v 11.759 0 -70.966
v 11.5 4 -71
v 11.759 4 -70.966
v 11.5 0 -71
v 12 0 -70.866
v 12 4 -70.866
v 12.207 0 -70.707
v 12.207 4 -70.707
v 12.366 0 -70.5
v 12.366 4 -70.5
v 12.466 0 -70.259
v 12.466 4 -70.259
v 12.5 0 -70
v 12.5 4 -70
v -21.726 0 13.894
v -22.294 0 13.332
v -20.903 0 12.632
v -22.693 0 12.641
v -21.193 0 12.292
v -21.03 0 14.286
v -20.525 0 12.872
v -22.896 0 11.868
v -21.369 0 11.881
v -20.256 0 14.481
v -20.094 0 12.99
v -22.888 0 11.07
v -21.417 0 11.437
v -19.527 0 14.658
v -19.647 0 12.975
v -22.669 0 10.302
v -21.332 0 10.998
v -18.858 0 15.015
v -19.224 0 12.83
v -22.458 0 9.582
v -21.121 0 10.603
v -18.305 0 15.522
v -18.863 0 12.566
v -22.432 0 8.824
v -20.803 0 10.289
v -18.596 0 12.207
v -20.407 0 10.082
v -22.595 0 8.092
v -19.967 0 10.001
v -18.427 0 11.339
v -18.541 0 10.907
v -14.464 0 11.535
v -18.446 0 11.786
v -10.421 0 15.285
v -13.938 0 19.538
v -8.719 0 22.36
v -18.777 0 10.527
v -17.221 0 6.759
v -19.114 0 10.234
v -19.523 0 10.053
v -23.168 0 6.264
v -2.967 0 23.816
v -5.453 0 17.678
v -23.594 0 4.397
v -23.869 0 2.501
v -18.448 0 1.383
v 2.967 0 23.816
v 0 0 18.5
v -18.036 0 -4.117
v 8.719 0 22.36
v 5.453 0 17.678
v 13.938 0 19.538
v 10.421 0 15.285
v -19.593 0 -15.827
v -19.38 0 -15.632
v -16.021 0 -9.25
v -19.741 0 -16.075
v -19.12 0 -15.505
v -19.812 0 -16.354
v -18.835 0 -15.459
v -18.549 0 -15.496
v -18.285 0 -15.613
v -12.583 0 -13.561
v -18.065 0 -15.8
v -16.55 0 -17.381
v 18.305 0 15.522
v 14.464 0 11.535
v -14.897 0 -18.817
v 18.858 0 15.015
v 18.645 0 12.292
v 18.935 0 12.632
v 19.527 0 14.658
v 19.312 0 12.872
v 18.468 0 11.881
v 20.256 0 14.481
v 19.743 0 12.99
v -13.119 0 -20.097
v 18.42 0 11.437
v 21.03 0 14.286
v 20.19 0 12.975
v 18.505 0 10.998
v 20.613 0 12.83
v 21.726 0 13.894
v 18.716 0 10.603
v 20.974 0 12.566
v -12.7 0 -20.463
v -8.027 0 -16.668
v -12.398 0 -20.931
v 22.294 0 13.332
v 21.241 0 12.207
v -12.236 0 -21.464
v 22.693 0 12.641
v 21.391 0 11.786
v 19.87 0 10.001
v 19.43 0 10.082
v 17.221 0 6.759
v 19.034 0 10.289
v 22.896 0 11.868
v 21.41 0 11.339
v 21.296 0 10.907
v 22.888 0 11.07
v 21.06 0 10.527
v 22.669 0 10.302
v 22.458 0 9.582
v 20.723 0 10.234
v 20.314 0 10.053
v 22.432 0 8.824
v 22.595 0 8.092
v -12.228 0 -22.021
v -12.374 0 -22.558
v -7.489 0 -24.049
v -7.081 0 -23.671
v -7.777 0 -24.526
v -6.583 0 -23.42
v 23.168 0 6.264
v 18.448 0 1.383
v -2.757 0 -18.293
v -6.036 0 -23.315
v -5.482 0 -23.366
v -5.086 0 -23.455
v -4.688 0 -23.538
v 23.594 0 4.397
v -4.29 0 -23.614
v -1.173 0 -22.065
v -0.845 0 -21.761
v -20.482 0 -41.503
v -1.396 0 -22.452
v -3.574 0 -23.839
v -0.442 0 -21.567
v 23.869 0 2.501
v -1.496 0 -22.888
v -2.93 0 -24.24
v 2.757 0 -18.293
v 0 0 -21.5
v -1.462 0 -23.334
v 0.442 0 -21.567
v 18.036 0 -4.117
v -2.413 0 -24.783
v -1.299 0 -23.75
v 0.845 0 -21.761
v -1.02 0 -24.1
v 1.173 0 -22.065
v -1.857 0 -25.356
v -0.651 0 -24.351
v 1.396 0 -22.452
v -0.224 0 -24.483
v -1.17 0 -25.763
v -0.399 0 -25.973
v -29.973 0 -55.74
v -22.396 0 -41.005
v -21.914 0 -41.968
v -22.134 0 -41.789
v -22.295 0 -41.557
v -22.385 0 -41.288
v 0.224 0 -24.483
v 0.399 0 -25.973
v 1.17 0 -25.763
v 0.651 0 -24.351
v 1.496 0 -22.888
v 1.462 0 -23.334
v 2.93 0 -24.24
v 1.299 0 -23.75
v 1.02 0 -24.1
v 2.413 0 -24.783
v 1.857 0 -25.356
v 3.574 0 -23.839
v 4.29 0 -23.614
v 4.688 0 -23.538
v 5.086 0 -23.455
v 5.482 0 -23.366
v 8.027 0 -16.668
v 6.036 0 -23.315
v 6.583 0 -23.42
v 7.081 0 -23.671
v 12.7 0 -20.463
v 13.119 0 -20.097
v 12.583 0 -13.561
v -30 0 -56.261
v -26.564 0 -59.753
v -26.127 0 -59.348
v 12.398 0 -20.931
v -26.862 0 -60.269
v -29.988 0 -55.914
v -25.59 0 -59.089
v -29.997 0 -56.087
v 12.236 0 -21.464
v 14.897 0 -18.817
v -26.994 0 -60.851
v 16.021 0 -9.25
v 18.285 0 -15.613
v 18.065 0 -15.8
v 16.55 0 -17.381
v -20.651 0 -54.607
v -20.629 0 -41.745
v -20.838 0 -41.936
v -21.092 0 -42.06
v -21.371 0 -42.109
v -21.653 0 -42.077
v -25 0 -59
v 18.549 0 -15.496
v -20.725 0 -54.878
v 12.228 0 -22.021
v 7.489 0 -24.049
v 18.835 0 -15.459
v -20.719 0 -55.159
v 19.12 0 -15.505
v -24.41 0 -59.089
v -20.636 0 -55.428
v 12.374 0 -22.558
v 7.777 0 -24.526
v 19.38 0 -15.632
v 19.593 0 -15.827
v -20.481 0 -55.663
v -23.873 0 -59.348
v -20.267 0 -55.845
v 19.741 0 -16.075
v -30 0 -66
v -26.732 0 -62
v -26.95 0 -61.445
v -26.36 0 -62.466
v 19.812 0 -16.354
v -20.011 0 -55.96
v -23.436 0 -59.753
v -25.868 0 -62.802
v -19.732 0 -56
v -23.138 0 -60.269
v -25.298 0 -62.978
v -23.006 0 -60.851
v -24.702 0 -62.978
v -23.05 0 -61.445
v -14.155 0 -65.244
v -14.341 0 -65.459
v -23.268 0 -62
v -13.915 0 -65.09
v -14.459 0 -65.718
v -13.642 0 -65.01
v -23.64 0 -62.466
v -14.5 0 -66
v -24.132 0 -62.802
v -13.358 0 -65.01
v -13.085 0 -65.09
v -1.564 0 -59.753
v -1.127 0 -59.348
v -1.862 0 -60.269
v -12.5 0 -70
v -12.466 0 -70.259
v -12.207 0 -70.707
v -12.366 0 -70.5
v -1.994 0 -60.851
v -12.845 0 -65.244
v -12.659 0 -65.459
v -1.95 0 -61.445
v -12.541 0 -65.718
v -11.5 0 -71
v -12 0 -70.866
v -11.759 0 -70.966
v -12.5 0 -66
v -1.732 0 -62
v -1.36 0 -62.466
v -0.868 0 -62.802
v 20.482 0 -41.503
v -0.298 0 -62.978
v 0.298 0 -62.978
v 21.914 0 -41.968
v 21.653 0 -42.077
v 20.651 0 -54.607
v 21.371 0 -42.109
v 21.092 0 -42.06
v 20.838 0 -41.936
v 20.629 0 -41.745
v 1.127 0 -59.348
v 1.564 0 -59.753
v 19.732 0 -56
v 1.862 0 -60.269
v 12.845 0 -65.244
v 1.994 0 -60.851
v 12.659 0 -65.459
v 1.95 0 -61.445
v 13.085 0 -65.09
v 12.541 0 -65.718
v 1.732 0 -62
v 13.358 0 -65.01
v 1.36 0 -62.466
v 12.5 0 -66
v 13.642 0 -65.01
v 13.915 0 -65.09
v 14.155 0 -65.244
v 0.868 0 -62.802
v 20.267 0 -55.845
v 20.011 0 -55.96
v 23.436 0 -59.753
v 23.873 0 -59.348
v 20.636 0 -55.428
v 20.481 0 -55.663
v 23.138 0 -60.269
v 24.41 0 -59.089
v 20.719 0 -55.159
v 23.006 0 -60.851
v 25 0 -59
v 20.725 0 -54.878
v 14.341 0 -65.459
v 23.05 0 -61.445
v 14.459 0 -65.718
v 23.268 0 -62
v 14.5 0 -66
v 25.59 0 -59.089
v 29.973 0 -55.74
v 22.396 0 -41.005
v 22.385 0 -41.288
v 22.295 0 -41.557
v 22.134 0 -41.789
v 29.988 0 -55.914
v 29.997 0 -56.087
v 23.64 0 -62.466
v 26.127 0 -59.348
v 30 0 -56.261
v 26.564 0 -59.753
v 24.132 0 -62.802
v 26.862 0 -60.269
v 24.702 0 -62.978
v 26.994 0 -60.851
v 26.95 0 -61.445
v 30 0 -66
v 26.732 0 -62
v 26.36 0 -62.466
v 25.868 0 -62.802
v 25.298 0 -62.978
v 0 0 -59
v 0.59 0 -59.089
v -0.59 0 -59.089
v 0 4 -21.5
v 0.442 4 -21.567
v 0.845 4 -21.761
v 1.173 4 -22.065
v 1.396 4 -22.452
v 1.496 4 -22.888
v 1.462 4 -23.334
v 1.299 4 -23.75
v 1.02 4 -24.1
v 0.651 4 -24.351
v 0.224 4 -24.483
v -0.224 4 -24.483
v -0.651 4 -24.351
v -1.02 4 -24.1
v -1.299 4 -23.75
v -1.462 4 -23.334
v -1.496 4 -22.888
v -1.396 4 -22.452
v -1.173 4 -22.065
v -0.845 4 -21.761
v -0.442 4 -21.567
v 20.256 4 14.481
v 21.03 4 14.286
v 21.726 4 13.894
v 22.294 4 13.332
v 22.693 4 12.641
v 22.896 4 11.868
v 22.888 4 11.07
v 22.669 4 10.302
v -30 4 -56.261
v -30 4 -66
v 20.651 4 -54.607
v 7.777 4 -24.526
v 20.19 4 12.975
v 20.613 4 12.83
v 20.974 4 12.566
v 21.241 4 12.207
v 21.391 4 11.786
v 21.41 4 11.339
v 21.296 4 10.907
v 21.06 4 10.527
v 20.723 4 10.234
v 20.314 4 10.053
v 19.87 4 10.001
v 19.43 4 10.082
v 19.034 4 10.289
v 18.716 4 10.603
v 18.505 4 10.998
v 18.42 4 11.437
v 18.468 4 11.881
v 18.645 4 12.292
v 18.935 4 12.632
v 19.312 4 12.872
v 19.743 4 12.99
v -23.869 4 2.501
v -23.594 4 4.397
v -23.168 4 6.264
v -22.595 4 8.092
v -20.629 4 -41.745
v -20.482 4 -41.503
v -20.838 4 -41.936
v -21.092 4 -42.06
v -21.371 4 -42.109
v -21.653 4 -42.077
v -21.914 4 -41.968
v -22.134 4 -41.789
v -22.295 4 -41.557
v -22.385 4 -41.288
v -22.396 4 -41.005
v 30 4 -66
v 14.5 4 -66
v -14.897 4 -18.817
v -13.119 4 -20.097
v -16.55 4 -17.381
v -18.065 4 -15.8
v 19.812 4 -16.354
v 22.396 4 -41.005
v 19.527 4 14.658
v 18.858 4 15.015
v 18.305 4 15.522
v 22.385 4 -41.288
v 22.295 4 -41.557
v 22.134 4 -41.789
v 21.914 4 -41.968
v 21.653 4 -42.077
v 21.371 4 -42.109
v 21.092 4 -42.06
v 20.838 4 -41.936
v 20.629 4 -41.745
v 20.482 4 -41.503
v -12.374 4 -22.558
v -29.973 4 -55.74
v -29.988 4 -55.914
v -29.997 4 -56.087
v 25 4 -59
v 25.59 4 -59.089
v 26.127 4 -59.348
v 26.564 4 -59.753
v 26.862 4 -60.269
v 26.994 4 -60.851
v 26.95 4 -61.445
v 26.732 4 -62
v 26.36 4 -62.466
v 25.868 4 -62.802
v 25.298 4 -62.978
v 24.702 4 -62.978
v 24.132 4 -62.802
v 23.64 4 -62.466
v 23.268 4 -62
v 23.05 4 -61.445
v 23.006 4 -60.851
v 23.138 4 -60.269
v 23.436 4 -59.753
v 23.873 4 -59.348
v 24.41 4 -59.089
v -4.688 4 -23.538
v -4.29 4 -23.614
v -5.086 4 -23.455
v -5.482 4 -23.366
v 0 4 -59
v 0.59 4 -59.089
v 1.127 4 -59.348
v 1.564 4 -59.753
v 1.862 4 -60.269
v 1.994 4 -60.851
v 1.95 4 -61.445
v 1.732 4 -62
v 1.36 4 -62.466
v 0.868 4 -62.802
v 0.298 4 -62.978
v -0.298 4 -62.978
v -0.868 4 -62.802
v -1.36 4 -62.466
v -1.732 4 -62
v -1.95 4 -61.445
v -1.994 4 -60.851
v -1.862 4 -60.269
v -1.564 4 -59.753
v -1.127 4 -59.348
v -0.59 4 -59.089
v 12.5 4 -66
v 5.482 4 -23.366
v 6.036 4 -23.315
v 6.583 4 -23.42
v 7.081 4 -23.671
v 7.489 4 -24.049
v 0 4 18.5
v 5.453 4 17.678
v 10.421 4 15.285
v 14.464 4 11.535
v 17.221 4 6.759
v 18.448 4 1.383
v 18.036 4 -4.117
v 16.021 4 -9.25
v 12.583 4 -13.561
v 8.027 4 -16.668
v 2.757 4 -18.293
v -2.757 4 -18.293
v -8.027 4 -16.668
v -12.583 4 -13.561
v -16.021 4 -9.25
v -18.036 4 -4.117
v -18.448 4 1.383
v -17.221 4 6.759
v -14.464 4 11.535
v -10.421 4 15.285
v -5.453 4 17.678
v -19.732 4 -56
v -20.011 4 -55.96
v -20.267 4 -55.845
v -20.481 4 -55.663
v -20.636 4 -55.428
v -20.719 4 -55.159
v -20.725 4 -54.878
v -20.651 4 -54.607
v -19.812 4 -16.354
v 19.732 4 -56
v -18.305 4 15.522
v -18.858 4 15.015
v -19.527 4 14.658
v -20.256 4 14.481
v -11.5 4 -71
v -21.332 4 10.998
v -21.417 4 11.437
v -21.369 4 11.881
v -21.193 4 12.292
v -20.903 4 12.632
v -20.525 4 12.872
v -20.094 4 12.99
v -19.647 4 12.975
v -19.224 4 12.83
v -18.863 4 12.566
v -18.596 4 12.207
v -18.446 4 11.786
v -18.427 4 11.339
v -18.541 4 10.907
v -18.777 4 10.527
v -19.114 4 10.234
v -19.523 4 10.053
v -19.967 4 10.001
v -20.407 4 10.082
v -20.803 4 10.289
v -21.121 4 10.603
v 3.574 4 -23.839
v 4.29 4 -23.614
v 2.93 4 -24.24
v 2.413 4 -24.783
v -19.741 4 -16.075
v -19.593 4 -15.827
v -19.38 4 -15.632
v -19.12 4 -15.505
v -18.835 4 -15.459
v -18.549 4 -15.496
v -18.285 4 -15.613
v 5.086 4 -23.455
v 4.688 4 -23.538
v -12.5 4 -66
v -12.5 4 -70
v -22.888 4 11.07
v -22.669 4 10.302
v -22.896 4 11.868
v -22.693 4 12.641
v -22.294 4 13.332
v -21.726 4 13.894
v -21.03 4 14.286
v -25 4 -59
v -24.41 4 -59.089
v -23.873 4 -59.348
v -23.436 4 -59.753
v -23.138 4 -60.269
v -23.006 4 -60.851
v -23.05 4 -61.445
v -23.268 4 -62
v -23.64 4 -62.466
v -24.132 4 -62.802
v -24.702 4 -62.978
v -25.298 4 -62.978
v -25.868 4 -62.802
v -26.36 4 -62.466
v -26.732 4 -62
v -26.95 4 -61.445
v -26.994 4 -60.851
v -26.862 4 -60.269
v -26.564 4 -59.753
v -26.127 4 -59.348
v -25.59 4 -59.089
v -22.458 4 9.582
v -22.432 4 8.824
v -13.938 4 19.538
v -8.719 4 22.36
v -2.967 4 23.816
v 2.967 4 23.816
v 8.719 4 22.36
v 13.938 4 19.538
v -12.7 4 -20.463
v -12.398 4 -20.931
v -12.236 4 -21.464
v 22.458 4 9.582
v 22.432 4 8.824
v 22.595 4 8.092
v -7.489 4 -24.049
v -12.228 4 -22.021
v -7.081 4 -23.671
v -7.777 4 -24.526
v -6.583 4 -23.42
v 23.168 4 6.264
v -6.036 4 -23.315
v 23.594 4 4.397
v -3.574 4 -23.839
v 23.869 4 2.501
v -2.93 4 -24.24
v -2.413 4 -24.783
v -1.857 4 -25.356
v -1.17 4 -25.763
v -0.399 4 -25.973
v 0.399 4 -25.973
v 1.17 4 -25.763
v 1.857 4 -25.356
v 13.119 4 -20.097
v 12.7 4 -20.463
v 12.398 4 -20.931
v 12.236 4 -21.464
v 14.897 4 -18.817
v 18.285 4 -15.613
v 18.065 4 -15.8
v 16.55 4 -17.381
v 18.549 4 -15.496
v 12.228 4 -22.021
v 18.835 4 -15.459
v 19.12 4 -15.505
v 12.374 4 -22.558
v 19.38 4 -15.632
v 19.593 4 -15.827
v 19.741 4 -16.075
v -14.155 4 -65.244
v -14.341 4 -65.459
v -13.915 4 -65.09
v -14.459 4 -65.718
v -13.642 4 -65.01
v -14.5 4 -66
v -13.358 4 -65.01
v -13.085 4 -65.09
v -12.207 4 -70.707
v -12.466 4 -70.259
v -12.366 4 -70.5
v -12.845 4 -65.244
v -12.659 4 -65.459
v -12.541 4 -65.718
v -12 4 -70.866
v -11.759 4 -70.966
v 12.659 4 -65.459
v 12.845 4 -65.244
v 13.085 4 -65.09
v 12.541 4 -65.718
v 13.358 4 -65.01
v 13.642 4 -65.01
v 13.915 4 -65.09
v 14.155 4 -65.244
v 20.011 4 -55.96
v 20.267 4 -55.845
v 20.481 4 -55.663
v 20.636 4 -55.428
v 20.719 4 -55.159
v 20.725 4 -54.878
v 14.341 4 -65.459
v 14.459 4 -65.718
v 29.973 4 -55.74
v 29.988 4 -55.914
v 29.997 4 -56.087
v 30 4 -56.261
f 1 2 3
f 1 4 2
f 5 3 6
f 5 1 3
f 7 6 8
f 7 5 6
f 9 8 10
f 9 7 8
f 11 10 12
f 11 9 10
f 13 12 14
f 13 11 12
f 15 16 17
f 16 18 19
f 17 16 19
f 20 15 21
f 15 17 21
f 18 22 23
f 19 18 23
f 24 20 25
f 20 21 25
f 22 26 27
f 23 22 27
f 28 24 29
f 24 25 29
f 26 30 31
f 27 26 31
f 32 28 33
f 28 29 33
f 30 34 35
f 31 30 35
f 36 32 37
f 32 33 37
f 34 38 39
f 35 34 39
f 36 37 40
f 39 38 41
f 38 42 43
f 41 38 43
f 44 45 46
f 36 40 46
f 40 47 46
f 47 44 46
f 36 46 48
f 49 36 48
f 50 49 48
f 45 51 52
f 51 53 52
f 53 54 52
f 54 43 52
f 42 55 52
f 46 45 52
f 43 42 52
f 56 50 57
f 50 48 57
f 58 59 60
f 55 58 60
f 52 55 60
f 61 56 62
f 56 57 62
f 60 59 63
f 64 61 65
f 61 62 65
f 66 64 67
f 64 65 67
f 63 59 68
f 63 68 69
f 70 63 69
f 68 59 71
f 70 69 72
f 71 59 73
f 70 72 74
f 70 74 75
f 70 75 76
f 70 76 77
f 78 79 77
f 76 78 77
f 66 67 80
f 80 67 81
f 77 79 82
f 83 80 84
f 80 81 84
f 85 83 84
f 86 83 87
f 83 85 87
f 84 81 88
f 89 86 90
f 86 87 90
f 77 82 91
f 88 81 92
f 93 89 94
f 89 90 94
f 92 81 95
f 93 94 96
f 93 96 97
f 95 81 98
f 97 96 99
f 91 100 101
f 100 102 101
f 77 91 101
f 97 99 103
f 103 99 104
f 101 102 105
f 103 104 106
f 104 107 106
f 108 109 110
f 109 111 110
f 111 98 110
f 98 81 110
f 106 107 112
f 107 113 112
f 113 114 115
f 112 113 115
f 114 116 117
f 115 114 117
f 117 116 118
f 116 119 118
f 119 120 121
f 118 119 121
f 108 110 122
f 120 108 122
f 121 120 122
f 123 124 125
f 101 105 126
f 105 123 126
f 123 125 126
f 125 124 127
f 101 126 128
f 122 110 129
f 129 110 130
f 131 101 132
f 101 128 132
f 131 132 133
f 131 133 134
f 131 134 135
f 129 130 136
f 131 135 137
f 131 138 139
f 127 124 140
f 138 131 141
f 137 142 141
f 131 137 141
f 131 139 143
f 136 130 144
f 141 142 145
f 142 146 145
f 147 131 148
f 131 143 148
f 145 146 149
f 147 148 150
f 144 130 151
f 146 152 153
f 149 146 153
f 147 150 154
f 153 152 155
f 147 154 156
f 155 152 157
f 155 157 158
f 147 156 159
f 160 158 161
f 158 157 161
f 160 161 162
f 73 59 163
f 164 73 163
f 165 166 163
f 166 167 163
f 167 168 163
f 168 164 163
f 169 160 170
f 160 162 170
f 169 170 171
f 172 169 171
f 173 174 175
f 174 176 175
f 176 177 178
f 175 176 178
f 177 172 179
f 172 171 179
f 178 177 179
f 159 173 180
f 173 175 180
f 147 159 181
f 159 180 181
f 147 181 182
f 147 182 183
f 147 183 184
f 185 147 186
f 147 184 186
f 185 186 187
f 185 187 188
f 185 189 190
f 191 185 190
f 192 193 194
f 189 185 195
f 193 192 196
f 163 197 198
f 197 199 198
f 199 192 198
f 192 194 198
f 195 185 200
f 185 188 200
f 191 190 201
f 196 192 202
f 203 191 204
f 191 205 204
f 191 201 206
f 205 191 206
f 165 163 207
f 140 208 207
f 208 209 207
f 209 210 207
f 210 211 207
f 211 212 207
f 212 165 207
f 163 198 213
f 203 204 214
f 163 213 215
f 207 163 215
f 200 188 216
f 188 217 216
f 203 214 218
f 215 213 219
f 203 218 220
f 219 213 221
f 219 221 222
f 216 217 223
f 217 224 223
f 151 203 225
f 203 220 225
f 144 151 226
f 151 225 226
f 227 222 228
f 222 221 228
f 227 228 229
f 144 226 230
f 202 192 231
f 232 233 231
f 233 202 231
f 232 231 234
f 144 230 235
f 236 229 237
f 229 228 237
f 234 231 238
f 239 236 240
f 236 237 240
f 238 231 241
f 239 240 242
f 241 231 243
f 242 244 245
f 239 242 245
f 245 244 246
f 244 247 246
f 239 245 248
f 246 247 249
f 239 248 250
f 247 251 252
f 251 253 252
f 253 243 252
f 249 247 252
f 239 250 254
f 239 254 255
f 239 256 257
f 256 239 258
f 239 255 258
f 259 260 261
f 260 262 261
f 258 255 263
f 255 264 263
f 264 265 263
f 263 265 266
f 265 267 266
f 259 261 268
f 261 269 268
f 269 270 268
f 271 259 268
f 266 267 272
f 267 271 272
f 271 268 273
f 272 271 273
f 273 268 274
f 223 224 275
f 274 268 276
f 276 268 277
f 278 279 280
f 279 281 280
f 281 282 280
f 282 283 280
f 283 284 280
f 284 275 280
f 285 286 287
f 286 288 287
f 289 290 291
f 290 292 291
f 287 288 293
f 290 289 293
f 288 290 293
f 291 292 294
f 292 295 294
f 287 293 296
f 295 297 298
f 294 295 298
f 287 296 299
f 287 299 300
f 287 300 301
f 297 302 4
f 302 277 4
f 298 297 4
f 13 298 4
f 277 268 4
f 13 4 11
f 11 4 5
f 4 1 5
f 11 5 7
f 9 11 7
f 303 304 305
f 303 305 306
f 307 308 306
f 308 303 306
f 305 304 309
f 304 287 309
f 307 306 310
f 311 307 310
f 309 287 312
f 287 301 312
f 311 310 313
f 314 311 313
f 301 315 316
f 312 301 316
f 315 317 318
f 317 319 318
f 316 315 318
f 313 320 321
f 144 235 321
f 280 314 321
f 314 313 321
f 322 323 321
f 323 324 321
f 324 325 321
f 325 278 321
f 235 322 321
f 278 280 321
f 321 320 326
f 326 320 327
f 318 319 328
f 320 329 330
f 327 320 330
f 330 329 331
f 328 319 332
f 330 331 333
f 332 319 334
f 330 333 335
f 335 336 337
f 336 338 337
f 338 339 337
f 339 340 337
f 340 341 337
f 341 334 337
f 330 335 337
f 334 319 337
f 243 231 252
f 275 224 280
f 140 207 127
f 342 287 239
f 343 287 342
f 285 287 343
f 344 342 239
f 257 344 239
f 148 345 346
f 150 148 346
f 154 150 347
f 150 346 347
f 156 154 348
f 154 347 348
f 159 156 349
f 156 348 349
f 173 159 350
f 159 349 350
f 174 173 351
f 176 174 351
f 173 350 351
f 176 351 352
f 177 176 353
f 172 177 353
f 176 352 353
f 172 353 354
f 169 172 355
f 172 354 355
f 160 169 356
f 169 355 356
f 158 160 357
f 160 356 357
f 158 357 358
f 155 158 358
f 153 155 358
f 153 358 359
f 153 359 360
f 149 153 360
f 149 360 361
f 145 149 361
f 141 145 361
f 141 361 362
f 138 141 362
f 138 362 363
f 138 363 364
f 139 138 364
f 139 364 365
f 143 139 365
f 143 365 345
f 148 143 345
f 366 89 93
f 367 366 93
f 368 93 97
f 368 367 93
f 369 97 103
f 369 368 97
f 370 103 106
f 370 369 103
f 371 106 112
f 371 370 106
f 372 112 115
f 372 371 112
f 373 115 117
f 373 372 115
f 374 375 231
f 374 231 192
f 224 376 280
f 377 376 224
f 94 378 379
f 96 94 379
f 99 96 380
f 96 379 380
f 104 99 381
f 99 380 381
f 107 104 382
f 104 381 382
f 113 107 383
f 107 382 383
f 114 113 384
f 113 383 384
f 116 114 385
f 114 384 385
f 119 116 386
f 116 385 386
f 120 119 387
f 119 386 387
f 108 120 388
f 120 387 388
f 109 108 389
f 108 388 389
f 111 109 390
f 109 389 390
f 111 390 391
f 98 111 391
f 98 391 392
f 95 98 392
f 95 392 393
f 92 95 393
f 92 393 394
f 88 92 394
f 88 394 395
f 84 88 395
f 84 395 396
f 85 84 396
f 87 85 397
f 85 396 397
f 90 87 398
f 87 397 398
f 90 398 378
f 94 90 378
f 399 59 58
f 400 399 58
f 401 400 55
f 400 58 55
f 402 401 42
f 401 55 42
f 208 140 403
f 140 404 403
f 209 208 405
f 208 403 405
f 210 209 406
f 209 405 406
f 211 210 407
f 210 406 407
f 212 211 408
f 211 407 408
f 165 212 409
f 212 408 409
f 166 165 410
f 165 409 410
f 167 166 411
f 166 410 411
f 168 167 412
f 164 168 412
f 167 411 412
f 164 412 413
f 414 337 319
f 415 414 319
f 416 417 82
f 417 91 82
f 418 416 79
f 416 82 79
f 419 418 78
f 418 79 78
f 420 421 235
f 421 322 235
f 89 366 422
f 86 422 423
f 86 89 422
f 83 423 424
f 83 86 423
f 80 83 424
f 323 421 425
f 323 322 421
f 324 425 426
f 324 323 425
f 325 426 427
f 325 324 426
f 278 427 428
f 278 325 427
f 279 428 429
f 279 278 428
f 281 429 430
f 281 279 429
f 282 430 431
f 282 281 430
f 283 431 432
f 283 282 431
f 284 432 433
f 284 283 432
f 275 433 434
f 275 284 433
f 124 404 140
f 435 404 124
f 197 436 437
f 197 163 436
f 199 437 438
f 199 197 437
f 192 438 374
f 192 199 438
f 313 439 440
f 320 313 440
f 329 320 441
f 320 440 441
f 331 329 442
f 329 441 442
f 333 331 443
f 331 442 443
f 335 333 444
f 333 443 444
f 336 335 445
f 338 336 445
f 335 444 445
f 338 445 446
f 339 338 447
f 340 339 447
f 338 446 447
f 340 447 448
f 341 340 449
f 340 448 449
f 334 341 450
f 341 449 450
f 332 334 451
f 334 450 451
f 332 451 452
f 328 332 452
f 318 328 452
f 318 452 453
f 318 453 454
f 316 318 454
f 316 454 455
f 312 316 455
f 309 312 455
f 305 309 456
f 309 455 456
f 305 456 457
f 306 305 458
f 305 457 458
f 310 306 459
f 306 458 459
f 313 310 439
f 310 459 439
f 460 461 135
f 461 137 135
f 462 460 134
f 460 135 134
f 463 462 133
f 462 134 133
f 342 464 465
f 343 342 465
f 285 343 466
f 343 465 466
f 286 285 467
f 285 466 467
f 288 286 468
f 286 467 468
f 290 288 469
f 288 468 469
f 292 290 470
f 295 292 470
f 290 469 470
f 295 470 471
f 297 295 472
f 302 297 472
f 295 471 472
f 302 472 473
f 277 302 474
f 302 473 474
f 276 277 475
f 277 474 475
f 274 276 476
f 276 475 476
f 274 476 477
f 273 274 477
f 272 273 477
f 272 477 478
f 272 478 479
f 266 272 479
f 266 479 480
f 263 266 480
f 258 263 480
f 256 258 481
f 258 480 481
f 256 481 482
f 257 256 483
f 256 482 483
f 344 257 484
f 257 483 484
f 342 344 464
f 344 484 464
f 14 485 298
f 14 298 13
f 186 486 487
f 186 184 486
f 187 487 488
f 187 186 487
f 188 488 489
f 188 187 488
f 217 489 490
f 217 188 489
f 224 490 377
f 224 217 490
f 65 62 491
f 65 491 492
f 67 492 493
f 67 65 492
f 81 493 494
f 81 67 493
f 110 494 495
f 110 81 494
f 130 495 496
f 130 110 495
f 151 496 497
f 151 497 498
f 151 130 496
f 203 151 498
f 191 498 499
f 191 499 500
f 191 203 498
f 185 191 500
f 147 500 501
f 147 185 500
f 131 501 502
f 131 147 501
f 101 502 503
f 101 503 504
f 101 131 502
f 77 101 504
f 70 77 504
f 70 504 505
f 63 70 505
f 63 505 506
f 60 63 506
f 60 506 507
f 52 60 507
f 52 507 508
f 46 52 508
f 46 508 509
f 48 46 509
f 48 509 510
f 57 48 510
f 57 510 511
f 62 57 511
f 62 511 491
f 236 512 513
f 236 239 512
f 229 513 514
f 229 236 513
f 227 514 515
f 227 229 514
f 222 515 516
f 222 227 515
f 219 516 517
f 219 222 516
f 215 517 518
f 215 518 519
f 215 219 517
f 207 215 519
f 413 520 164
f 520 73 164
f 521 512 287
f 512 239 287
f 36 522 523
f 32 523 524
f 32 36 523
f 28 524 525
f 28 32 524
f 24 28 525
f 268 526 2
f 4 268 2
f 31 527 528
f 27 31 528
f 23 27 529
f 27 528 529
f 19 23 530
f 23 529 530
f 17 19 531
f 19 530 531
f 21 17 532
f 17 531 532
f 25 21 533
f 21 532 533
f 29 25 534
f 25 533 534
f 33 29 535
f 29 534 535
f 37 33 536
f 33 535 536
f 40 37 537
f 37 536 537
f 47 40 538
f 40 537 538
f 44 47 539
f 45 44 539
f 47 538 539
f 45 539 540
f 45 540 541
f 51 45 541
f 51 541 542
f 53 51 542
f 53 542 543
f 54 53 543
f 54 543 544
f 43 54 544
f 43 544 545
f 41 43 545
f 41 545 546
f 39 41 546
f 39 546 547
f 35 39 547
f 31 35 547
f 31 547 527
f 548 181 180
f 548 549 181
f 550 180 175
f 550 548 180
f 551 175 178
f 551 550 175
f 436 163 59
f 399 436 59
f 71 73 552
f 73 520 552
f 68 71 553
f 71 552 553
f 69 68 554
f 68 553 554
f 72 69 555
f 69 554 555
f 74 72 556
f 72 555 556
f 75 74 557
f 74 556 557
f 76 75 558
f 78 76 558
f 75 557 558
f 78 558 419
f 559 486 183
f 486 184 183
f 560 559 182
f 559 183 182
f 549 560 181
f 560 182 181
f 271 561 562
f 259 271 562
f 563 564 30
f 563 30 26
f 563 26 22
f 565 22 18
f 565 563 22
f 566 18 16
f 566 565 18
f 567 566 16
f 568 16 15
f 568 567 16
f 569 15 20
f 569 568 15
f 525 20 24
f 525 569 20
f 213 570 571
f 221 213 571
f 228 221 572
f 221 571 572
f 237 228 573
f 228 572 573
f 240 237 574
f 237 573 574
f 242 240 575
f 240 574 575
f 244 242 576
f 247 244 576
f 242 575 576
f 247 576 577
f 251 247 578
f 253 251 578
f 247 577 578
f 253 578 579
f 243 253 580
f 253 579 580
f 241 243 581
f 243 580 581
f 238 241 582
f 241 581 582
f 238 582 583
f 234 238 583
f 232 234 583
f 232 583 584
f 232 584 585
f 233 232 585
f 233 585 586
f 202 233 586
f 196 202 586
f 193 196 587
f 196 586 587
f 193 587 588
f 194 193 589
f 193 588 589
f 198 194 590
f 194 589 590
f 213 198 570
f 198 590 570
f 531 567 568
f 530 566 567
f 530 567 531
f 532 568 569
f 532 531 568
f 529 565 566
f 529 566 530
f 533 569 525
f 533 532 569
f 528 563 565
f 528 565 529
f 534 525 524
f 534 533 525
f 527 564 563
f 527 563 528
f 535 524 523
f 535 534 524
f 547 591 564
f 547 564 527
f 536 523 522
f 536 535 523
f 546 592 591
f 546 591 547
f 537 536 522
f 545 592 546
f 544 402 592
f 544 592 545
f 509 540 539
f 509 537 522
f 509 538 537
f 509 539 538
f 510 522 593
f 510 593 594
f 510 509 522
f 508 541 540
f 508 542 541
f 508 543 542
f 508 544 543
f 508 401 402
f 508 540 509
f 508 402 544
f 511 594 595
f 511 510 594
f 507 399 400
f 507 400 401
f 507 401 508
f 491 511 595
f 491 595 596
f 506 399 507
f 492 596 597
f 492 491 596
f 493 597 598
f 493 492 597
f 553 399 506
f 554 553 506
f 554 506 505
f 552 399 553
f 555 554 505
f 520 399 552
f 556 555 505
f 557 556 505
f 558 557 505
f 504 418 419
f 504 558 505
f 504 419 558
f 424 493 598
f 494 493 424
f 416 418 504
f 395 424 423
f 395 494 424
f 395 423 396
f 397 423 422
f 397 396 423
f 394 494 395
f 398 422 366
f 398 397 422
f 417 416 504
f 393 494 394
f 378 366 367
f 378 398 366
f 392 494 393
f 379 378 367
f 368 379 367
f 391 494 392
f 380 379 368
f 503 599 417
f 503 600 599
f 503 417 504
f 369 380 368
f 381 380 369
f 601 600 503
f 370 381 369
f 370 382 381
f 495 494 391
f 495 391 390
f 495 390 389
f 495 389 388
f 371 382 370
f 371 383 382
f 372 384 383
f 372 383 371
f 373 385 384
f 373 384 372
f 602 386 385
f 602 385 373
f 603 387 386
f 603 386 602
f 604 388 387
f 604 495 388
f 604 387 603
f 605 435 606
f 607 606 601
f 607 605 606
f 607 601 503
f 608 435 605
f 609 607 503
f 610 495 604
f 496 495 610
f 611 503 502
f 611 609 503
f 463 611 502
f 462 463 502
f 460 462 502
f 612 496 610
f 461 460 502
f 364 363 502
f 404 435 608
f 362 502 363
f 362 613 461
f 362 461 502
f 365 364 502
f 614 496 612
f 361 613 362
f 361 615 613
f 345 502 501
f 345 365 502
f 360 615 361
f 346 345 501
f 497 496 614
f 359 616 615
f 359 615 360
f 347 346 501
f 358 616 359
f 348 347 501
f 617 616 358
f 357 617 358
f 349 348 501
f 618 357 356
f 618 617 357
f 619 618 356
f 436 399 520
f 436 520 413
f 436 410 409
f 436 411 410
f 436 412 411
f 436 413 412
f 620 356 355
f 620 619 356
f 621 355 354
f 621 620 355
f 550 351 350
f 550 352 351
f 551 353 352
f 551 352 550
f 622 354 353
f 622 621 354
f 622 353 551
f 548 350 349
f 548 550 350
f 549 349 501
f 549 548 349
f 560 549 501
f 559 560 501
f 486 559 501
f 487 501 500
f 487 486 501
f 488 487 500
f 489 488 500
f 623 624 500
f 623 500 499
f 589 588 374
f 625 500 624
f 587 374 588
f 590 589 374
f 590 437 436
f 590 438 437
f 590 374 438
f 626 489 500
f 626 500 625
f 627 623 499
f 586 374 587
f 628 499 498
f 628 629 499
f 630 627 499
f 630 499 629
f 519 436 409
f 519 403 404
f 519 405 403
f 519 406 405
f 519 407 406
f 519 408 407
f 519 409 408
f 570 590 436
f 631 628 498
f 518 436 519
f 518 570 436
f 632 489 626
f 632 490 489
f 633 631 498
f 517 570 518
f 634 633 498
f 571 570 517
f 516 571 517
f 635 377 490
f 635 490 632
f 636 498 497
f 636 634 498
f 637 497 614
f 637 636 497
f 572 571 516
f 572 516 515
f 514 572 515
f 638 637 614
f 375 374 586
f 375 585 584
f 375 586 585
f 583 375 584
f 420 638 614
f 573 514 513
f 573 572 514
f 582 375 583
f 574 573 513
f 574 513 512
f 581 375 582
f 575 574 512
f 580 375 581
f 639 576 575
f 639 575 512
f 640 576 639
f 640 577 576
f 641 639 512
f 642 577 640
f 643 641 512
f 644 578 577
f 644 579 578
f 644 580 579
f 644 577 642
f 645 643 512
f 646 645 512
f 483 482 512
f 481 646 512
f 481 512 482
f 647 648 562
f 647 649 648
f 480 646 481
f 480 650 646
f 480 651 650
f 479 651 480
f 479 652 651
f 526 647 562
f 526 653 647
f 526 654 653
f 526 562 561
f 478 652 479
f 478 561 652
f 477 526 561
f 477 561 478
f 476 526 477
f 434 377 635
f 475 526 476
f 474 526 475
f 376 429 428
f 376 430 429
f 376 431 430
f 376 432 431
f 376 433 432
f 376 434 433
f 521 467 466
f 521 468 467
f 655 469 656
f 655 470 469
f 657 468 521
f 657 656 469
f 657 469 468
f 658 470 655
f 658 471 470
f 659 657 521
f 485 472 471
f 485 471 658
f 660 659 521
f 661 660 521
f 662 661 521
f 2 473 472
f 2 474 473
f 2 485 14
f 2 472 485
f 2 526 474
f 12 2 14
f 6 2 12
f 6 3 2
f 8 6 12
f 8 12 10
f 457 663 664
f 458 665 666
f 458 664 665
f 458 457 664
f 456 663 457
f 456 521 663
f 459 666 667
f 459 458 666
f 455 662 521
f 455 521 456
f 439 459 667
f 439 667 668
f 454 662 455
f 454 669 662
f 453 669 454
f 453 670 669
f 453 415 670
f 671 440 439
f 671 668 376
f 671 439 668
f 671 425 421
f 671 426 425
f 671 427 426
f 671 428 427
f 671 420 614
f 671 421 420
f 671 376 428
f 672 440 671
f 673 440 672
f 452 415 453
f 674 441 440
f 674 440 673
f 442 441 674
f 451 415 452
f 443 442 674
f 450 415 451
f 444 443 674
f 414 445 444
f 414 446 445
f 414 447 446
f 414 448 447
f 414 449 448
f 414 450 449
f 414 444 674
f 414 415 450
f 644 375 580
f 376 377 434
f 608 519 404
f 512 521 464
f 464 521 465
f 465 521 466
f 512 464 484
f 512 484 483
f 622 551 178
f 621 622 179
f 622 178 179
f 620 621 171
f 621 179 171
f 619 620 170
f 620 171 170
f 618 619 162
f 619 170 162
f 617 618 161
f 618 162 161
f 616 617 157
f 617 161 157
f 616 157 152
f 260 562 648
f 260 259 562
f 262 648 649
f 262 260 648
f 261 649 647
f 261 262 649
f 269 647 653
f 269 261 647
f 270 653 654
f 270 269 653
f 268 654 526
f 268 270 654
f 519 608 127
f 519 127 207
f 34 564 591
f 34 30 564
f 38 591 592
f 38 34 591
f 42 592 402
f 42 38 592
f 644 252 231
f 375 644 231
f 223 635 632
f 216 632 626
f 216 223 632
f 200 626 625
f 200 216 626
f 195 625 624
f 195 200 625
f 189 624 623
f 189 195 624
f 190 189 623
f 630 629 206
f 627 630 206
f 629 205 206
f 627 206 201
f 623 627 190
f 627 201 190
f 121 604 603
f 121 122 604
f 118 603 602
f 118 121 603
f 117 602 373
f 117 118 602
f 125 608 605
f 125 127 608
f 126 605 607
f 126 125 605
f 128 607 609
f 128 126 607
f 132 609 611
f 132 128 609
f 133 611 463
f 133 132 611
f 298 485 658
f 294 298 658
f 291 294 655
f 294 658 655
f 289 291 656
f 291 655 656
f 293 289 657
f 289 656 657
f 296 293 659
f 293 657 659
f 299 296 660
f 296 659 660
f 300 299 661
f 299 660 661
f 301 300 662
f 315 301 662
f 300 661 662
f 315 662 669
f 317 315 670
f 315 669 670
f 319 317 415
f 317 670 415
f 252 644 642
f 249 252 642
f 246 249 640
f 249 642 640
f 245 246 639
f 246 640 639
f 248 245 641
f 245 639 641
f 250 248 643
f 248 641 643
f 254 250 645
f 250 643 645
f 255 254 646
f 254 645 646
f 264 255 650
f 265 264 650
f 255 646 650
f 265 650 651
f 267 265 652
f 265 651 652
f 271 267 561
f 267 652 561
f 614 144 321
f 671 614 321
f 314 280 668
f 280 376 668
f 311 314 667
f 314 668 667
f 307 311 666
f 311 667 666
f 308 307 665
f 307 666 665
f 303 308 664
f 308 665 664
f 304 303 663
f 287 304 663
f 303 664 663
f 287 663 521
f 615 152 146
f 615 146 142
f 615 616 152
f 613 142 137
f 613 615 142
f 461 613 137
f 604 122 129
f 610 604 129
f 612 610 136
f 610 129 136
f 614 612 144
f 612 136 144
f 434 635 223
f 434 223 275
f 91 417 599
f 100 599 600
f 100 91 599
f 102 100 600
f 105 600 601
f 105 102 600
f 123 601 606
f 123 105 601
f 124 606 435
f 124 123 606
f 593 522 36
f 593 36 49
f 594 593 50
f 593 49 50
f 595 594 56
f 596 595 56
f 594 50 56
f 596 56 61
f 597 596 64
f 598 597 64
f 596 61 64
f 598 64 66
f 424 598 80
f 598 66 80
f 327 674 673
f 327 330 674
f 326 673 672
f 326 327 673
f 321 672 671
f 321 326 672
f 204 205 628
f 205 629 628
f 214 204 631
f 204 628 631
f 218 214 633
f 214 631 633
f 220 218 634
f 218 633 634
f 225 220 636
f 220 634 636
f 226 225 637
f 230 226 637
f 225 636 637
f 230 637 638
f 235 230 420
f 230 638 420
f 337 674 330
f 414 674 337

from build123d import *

# Parameters (mm, degrees)
SKETCH_1_R          = 18.5
EXTRUDE_1_DEPTH     = 4
SKETCH_2_R          = 5
SKETCH_2_R_2        = 1.5
CUT_EXTRUDE_1_DEPTH = 10
SKETCH_4_R          = 2
CUT_EXTRUDE_2_DEPTH = 4
SKETCH_5_W          = 25
SKETCH_5_H          = 5
EXTRUDE_2_DEPTH     = 4
SKETCH_6_R          = 1
CUT_EXTRUDE_3_DEPTH = 10
FILLET_2_R          = 1
CUT_EXTRUDE_START   = -5
CUT_EXTRUDE_4_DEPTH = 5
EXTRUDE_1_2_DEPTH   = 4
FILLET_3_R          = 2
FILLET_4_R          = 3
FILLET_5_R          = 1
SKETCH_10_R         = 3
SKETCH_10_R_2       = 1.5
EXTRUDE_3_DEPTH     = 4
FILLET_6_R          = 3
CUT_EXTRUDE_5_DEPTH = 4
FILLET_7_R          = 5


with BuildPart() as part:
    # 草图1 → Extrude 1 (new body)
    with BuildSketch(Plane(origin=(0, 0, 0), x_dir=(1, 0, 0), z_dir=(0, 1, 0))):
        with BuildLine():
            ThreePointArc((-23.869289328, -2.501404997), (0, -24), (23.869289328, -2.501404997))
            Line((23.869289328, -2.501404997), (31.047959561, 66))
            Line((31.047959561, 66), (-31.047959561, 66))
            Line((-31.047959561, 66), (-23.869289328, -2.501404997))
        make_face()
        with Locations(Location((0, 0, 0), (0, 0, 270))):
            Circle(SKETCH_1_R, mode=Mode.SUBTRACT)
    extrude(amount=EXTRUDE_1_DEPTH)

    # 草图2 → 切除-拉伸1 (cut)
    with BuildSketch(Plane(origin=(0, 4, 0), x_dir=(1, 0, 0), z_dir=(0, 1, 0))):
        with Locations((0, -31.5)):
            Circle(SKETCH_2_R)
        with Locations(Location((0, 23, 0), (0, 0, 270))):
            Circle(SKETCH_2_R_2)
        with Locations((19.918584287, -11.5)):
            Circle(SKETCH_2_R_2)
        with Locations((-19.918584287, -11.5)):
            Circle(SKETCH_2_R_2)
    extrude(amount=-CUT_EXTRUDE_1_DEPTH, mode=Mode.SUBTRACT)

    # 草图4 → 切除-拉伸2 (cut)
    with BuildSketch(Plane(origin=(0, 4, 0), x_dir=(1, 0, 0), z_dir=(0, 1, 0))):
        with Locations(Location((-25, 61, 0), (0, 0, 270))):
            Circle(SKETCH_4_R)
        with Locations(Location((0, 61, 0), (0, 0, 270))):
            Circle(SKETCH_4_R)
        with Locations(Location((25, 61, 0), (0, 0, 270))):
            Circle(SKETCH_4_R)
    extrude(amount=-CUT_EXTRUDE_2_DEPTH, mode=Mode.SUBTRACT)

    # 草图5 → 凸台-拉伸2 (add)
    with BuildSketch(Plane(origin=(0, 4, 0), x_dir=(1, 0, 0), z_dir=(0, 1, 0))):
        with Locations((0, 68.5)):
            Rectangle(SKETCH_5_W, SKETCH_5_H)
    extrude(amount=-EXTRUDE_2_DEPTH)

    # 草图6 → 切除-拉伸3 (cut)
    with BuildSketch(Plane(origin=(0, 4, 0), x_dir=(1, 0, 0), z_dir=(0, 1, 0))):
        with Locations((-13.5, 66)):
            Circle(SKETCH_6_R)
        with Locations((13.5, 66)):
            Circle(SKETCH_6_R)
    extrude(amount=-CUT_EXTRUDE_3_DEPTH, mode=Mode.SUBTRACT)

    # 圆角2
    fillet_2_edges = [part.edges().sort_by_distance(p)[0] for p in [
        (12.5, 2, -71),
        (-12.5, 2, -71),
    ]]
    fillet(fillet_2_edges, radius=FILLET_2_R)

    # 草图7 → 切除-拉伸4 (cut)
    with BuildSketch(Plane(origin=(0, 4, 0), x_dir=(1, 0, 0), z_dir=(0, 1, 0)).offset(CUT_EXTRUDE_START)):
        with BuildLine():
            Line((-19.556490884, 13.911997136), (-23.967143386, 56))
            Line((-23.967143386, 56), (23.967143386, 56))
            Line((23.967143386, 56), (19.556490884, 13.911997136))
            ThreePointArc((19.556490884, 13.911997136), (12.266476425, 20.628464705), (2.884021557, 23.826086957))
            ThreePointArc((2.884021557, 23.826086957), (0, 26), (-2.884021557, 23.826086957))
            ThreePointArc((-2.884021557, 23.826086957), (-12.266476425, 20.628464705), (-19.556490884, 13.911997136))
        make_face()
    extrude(amount=CUT_EXTRUDE_4_DEPTH, mode=Mode.SUBTRACT)

    # 草图8 → Extrude 1 2 (add)
    with BuildSketch(Plane(origin=(0, 4, 0), x_dir=(1, 0, 0), z_dir=(0, 1, 0))):
        Polygon((-26.265493929, 55.016341125), (-9.577426219, 16.024135141), (-4.980725133, 17.991452891), (-21.668792843, 56.983658875), align=None)
        Polygon((21.668792843, 56.983658875), (4.980725133, 17.991452891), (9.577426219, 16.024135141), (26.265493929, 55.016341125), align=None)
    extrude(amount=-EXTRUDE_1_2_DEPTH)

    # 圆角3
    fillet_3_edges = [part.edges().sort_by_distance(p)[0] for p in [
        (-11.690103776, 2, -20.960474081),
        (-7.09340269, 2, -22.927791832),
        (11.690103776, 2, -20.960474081),
        (7.09340269, 2, -22.927791832),
    ]]
    fillet(fillet_3_edges, radius=FILLET_3_R)

    # 圆角4
    fillet_4_edges = [part.edges().sort_by_distance(p)[0] for p in [
        (-2.884021557, 2, -23.826086957),
        (2.884021557, 2, -23.826086957),
    ]]
    fillet(fillet_4_edges, radius=FILLET_4_R)

    # 圆角5
    fillet_5_edges = [part.edges().sort_by_distance(p)[0] for p in [
        (-19.556490884, 2, -13.911997136),
        (19.556490884, 2, -13.911997136),
        (-21.247801891, 2, -56),
        (-23.085380037, 2, -47.585902918),
        (21.247801891, 2, -56),
        (23.085380037, 2, -47.585902918),
    ]]
    fillet(fillet_5_edges, radius=FILLET_5_R)

    # 草图10 → 凸台-拉伸3 (add)
    # profile 1 of 2: a face of its own
    with BuildSketch(Plane(origin=(0, 4, 0), x_dir=(1, 0, 0), z_dir=(0, 1, 0))):
        with Locations((-19.918584287, -11.5)):
            Circle(SKETCH_10_R)
        with Locations(Location((-19.918584287, -11.5, 0), (0, 0, 270))):
            Circle(SKETCH_10_R_2, mode=Mode.SUBTRACT)
    # profile 2 of 2: a face of its own
    with BuildSketch(Plane(origin=(0, 4, 0), x_dir=(1, 0, 0), z_dir=(0, 1, 0))):
        with Locations((19.918584287, -11.5)):
            Circle(SKETCH_10_R)
        with Locations(Location((19.918584287, -11.5, 0), (0, 0, 270))):
            Circle(SKETCH_10_R_2, mode=Mode.SUBTRACT)
    extrude(amount=-EXTRUDE_3_DEPTH)

    # 圆角6
    fillet_6_edges = [part.edges().sort_by_distance(p)[0] for p in [
        (-22.076007356, 2, 9.415407545),
        (-19.191985799, 2, 14.410679412),
        (22.076007356, 2, 9.415407545),
        (19.191985799, 2, 14.410679412),
    ]]
    fillet(fillet_6_edges, radius=FILLET_6_R)

    # 草图11 → 切除-拉伸5 (cut)
    with BuildSketch(Plane(origin=(0, 4, 0), x_dir=(1, 0, 0), z_dir=(0, 1, 0))):
        Polygon((-30, 66), (-30, 56), (-31.047959561, 66), align=None)
        Polygon((30, 66), (31.047959561, 66), (30, 56), align=None)
    extrude(amount=-CUT_EXTRUDE_5_DEPTH, mode=Mode.SUBTRACT)

    # 圆角7
    fillet_7_edges = [part.edges().sort_by_distance(p)[0] for p in [
        (-30, 2, -56),
        (30, 2, -56),
    ]]
    fillet(fillet_7_edges, radius=FILLET_7_R)


solid = part.part
